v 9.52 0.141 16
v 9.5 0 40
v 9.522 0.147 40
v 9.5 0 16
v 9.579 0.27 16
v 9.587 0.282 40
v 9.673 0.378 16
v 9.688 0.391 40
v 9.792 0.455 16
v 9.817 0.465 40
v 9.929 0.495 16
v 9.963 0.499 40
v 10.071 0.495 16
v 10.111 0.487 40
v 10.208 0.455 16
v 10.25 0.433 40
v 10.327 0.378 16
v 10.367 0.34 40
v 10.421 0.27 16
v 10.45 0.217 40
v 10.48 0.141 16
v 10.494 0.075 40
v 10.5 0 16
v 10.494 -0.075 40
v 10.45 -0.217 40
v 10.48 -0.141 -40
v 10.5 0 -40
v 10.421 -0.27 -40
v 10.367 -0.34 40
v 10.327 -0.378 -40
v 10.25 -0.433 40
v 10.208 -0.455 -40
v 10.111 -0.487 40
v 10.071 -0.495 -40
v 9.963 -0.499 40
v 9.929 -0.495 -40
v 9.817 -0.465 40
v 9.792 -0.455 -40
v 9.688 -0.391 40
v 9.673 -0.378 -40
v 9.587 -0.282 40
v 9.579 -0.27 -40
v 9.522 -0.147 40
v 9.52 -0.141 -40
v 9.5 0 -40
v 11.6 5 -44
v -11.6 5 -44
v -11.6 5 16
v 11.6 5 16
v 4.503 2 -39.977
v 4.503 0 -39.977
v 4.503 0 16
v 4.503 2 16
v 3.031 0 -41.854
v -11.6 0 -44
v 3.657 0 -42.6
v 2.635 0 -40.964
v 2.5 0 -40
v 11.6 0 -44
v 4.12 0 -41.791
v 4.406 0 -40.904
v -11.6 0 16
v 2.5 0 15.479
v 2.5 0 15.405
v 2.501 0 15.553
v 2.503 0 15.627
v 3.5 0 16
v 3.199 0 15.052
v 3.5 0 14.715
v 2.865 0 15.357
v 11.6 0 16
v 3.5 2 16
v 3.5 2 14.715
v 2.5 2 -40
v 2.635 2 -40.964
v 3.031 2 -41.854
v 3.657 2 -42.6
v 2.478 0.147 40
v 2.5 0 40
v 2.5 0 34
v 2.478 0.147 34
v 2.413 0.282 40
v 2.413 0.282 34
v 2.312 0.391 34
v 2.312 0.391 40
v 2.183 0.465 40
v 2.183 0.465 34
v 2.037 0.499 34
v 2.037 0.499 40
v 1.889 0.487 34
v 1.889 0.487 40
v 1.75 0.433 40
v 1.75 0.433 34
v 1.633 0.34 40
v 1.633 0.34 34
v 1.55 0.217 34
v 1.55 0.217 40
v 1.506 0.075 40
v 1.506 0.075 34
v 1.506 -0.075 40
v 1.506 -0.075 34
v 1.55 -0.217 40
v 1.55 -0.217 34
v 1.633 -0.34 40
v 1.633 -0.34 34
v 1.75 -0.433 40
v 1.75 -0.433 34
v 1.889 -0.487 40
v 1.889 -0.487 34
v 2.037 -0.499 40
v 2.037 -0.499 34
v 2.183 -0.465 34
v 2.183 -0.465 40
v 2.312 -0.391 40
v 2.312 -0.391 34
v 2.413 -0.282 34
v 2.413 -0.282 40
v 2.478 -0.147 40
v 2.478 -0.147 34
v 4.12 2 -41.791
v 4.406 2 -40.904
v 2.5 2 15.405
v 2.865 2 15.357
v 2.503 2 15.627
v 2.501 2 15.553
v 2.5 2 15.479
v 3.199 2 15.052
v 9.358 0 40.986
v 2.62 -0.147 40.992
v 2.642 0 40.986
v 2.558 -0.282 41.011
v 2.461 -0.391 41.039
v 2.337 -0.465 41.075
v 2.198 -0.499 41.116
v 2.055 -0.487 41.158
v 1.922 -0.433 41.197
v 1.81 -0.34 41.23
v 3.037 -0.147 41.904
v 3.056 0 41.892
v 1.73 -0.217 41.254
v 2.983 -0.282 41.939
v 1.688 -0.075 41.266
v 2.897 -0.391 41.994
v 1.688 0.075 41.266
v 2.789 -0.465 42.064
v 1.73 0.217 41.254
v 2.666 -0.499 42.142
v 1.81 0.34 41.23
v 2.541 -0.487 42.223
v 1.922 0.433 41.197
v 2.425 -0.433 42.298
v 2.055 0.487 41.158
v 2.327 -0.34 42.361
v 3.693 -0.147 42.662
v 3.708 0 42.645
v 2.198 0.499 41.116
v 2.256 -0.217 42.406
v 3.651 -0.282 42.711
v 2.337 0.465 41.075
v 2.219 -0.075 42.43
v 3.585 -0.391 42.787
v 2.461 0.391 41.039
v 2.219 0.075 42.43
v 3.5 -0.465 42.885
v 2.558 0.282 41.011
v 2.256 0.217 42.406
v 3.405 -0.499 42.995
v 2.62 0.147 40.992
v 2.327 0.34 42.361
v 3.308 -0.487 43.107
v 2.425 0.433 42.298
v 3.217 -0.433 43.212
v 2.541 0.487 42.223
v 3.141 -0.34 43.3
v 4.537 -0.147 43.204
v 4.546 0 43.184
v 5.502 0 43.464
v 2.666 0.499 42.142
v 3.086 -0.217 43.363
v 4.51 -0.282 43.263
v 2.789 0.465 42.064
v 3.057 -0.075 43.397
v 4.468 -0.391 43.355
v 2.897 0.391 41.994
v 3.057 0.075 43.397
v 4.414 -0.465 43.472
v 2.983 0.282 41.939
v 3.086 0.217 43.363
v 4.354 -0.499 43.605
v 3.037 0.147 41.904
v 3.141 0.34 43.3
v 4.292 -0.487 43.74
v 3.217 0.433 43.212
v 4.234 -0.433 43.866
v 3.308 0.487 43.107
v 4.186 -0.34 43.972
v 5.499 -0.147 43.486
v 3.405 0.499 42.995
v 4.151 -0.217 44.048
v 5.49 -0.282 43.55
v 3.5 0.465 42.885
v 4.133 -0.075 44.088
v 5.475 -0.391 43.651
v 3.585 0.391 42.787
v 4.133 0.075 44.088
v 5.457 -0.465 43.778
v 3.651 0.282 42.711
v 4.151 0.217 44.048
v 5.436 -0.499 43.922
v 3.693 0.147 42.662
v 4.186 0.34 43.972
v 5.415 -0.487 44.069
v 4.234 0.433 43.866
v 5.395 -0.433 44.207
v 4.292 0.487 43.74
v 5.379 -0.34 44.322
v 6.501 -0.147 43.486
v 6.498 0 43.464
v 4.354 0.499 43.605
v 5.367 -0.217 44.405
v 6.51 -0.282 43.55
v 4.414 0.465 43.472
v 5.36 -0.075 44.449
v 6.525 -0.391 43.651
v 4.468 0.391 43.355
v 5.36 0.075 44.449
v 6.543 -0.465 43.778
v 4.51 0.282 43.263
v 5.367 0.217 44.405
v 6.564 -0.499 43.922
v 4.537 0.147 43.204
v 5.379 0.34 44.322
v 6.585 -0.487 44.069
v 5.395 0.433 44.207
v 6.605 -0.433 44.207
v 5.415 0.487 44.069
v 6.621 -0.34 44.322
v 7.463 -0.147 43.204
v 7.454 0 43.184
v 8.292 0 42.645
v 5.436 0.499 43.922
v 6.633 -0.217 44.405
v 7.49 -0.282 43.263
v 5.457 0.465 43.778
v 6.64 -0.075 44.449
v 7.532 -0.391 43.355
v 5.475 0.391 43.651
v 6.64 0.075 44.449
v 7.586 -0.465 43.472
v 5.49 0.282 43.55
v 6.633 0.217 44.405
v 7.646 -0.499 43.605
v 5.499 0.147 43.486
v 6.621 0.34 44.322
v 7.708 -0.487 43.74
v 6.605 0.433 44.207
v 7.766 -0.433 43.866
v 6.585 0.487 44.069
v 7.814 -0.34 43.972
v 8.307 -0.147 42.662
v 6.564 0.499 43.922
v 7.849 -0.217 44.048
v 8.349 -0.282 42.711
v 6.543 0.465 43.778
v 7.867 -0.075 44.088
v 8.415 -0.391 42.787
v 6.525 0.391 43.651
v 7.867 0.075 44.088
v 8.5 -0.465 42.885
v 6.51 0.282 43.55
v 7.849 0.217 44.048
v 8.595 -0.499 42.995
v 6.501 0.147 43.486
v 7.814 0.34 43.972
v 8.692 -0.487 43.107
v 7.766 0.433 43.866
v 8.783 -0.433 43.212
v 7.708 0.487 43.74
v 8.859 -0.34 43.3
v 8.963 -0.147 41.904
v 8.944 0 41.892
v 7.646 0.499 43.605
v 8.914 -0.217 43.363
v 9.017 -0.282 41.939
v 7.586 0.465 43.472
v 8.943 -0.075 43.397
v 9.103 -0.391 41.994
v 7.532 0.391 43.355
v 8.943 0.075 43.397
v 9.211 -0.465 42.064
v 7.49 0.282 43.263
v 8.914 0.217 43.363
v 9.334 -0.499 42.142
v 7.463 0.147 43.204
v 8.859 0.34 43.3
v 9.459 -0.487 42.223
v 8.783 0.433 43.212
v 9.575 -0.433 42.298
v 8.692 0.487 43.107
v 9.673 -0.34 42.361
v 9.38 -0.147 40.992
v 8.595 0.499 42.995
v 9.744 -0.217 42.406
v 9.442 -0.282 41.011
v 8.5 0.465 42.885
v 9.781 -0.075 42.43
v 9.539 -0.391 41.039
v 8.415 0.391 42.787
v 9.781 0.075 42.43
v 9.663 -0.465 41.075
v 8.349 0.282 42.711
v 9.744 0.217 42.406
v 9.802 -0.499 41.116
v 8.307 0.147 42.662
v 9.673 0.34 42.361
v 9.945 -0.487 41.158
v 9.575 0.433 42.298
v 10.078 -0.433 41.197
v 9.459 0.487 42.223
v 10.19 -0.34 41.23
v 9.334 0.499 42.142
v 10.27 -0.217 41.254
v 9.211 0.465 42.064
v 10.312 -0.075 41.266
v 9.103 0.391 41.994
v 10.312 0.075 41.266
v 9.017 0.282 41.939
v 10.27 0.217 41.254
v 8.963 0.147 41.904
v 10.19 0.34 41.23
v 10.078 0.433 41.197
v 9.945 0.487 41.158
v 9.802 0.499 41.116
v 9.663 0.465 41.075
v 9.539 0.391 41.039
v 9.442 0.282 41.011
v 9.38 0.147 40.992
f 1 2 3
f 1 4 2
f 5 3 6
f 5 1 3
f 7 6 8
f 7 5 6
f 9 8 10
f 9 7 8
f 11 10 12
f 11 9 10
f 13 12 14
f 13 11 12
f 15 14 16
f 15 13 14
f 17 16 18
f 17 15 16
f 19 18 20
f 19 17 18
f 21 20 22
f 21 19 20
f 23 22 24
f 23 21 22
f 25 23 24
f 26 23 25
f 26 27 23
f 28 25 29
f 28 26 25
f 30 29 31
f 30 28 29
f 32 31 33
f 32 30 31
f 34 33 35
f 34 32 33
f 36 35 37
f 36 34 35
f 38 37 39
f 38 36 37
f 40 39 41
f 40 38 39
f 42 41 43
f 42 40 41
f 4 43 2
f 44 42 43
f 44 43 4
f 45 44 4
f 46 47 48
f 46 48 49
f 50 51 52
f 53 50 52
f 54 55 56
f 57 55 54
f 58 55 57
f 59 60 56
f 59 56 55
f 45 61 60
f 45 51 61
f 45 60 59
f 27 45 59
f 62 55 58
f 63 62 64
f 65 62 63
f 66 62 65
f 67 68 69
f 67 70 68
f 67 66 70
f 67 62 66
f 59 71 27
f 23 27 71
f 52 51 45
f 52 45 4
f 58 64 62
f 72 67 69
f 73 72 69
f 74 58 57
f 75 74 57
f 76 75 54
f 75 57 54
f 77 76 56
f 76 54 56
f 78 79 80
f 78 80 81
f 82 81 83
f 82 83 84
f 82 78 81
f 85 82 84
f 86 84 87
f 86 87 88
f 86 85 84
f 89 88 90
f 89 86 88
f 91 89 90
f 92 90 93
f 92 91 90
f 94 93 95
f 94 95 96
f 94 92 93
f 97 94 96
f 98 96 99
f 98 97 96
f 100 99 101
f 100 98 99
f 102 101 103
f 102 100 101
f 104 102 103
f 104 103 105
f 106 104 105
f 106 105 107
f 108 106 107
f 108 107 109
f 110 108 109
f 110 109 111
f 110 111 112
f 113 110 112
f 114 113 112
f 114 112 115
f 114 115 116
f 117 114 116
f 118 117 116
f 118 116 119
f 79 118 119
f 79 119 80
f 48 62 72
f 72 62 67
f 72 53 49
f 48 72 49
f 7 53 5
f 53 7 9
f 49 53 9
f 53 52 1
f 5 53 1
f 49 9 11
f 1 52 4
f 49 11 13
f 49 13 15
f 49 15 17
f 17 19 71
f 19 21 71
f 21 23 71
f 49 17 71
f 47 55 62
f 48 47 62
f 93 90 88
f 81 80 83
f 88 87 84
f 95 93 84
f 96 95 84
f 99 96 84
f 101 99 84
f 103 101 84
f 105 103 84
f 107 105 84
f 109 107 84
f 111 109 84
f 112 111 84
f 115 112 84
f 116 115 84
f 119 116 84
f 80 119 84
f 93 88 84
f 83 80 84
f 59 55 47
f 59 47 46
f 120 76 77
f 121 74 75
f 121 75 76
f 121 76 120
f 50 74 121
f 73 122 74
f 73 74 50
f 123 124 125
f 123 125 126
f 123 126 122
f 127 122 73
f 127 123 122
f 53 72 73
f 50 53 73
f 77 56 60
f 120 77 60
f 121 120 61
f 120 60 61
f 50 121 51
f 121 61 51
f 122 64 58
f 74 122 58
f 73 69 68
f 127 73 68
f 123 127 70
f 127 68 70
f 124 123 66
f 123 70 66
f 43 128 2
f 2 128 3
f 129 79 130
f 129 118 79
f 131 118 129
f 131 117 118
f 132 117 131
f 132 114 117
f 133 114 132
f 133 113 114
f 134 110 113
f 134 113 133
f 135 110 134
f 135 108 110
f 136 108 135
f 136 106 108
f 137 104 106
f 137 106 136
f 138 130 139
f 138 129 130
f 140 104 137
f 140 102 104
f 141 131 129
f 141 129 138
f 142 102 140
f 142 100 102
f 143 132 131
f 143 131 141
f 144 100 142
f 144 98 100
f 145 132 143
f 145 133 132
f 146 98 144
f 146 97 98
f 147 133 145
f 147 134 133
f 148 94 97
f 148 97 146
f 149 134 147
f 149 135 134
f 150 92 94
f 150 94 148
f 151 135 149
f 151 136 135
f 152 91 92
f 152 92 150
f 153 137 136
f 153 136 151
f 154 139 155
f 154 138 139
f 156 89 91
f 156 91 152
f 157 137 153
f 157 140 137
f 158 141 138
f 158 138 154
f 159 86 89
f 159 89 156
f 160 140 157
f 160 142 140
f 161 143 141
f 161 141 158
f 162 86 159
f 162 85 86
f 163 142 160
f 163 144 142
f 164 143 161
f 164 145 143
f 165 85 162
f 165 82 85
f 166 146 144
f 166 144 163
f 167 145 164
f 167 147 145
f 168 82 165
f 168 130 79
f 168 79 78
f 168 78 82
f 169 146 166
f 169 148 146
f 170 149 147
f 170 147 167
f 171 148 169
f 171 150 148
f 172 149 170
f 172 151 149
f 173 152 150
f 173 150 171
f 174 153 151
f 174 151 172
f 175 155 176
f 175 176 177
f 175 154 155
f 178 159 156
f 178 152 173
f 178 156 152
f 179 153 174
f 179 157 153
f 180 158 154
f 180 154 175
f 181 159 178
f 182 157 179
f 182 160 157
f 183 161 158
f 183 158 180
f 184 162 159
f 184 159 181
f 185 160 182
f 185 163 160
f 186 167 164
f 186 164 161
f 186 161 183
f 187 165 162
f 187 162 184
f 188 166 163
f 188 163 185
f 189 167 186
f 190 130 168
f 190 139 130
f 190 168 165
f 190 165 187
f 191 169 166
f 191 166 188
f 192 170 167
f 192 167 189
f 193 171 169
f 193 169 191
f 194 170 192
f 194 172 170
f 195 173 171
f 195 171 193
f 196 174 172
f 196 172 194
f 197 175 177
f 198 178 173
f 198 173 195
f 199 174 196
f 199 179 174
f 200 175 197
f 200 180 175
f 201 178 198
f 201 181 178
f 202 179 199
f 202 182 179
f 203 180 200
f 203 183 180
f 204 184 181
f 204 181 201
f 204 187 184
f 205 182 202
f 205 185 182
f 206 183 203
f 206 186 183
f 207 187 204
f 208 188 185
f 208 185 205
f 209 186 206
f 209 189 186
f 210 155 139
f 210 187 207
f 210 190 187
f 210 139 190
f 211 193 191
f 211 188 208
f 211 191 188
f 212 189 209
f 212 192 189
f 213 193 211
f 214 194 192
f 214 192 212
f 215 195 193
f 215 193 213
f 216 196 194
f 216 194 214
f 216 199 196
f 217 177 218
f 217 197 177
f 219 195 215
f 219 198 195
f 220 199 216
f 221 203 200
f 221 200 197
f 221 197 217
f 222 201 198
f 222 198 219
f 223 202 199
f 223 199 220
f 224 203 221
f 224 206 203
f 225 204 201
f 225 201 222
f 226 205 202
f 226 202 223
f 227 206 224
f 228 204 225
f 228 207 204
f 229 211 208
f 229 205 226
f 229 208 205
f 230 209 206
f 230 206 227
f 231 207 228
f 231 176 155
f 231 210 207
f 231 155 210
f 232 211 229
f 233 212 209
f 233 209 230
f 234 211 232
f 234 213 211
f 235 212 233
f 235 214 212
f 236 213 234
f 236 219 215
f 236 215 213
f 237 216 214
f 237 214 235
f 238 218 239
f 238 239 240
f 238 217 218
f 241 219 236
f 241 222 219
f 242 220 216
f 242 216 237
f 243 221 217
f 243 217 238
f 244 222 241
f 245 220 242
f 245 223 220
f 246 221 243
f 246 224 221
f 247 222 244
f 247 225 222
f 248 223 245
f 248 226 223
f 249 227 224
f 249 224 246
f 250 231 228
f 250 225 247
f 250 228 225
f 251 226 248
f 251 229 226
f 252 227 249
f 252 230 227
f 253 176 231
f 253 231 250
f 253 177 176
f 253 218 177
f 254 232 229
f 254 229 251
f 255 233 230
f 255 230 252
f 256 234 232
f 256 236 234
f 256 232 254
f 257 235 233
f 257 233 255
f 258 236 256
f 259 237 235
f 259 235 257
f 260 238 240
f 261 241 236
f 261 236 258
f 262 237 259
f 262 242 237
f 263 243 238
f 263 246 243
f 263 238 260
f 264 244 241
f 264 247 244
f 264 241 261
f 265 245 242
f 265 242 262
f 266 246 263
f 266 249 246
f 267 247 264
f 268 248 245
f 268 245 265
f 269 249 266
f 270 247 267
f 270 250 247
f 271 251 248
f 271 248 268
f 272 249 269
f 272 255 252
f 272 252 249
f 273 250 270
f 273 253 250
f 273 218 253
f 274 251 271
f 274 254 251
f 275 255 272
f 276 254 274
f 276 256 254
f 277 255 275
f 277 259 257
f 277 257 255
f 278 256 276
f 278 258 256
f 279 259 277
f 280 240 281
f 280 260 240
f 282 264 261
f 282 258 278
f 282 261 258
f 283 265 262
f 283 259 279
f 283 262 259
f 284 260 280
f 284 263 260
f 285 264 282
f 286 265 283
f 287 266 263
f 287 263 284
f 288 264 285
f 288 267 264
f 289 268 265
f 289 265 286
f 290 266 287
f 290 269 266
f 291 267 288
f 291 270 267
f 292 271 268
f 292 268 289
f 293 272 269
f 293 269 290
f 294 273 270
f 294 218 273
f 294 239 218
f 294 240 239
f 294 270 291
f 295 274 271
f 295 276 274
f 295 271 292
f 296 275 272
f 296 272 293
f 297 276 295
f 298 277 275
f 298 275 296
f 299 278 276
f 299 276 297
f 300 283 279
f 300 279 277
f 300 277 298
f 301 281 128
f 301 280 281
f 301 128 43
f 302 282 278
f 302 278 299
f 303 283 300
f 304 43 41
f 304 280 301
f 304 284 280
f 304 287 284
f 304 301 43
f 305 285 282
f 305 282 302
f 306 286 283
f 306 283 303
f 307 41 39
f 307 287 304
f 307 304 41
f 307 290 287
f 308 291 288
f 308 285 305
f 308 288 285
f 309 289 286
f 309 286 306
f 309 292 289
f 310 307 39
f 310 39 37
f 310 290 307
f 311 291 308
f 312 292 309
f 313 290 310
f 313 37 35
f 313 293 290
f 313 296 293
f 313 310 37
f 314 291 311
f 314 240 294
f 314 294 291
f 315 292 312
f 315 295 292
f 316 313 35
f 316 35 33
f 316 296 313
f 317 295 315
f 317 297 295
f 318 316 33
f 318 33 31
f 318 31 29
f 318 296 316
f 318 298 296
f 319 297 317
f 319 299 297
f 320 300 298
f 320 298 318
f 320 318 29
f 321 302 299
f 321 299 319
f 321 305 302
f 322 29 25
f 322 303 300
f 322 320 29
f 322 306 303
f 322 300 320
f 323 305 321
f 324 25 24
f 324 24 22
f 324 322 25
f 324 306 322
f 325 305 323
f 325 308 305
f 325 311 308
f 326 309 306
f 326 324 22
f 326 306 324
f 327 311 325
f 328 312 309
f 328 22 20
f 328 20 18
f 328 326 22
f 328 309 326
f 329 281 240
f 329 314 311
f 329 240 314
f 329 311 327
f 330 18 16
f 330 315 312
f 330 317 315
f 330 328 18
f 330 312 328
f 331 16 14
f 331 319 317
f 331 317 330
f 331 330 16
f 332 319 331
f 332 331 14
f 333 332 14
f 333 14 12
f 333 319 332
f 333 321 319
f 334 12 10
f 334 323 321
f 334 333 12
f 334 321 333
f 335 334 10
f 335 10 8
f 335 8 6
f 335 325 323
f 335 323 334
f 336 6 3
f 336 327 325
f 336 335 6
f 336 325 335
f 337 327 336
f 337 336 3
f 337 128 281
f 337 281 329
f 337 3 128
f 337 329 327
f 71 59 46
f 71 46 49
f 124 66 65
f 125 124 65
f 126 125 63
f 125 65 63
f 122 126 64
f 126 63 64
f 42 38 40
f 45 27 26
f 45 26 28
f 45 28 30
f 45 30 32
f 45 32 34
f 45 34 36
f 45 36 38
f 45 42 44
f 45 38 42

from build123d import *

# Parameters (mm, degrees)
F1_W     = 23.2
F1_H     = 60
F2_DEPTH = 5
F5_DEPTH = 2
F7_R     = 0.5


with BuildPart() as f2:
    # F1 (on Front) → F2 (new body)
    with BuildSketch(Plane.XZ):
        with Locations((0, -14)):
            Rectangle(F1_W, F1_H)
    extrude(amount=-F2_DEPTH)

    # F4 (on face) → F5 (cut)
    with BuildSketch(Plane.XZ):
        with BuildLine():
            Line((4.5032451175, -39.9769037598), (4.5032451175, 12.0230962402))
            Line((4.5032451175, 12.0230962402), (4.5032451175, 16))
            Line((4.5032451175, 16), (3.5, 16))
            Line((3.5, 16), (3.5, 14.7152424996))
            ThreePointArc((3.5, 14.7152424996), (3.0356981489, 15.2086247741), (2.5025880537, 15.6267107751))
            ThreePointArc((2.5025880537, 15.6267107751), (2.5006470354, 15.5158509267), (2.5, 15.4049759751))
            Line((2.5, 15.4049759751), (2.5, -40))
            ThreePointArc((2.5, -40), (2.8023140413, -41.4229562572), (3.6570311485, -42.6000955676))
            ThreePointArc((3.6570311485, -42.6000955676), (4.2859243089, -41.3548841104), (4.5032451175, -39.9769037598))
        make_face()
    extrude(amount=-F5_DEPTH, mode=Mode.SUBTRACT)

    # F8: sweep along a path in F0
    with BuildLine(Plane.XZ) as f8_path:
        Line((2, 34), (2, 40))
        ThreePointArc((2, 40), (6, 44), (10, 40))
        Line((10, 40), (10, -40))
    # F7 (on plane+point) → F8 (sweep)
    with BuildSketch(Plane.XY.offset(34)):
        with Locations((2, 0)):
            Circle(F7_R)
    sweep(path=f8_path.line)


solid = f2.part
